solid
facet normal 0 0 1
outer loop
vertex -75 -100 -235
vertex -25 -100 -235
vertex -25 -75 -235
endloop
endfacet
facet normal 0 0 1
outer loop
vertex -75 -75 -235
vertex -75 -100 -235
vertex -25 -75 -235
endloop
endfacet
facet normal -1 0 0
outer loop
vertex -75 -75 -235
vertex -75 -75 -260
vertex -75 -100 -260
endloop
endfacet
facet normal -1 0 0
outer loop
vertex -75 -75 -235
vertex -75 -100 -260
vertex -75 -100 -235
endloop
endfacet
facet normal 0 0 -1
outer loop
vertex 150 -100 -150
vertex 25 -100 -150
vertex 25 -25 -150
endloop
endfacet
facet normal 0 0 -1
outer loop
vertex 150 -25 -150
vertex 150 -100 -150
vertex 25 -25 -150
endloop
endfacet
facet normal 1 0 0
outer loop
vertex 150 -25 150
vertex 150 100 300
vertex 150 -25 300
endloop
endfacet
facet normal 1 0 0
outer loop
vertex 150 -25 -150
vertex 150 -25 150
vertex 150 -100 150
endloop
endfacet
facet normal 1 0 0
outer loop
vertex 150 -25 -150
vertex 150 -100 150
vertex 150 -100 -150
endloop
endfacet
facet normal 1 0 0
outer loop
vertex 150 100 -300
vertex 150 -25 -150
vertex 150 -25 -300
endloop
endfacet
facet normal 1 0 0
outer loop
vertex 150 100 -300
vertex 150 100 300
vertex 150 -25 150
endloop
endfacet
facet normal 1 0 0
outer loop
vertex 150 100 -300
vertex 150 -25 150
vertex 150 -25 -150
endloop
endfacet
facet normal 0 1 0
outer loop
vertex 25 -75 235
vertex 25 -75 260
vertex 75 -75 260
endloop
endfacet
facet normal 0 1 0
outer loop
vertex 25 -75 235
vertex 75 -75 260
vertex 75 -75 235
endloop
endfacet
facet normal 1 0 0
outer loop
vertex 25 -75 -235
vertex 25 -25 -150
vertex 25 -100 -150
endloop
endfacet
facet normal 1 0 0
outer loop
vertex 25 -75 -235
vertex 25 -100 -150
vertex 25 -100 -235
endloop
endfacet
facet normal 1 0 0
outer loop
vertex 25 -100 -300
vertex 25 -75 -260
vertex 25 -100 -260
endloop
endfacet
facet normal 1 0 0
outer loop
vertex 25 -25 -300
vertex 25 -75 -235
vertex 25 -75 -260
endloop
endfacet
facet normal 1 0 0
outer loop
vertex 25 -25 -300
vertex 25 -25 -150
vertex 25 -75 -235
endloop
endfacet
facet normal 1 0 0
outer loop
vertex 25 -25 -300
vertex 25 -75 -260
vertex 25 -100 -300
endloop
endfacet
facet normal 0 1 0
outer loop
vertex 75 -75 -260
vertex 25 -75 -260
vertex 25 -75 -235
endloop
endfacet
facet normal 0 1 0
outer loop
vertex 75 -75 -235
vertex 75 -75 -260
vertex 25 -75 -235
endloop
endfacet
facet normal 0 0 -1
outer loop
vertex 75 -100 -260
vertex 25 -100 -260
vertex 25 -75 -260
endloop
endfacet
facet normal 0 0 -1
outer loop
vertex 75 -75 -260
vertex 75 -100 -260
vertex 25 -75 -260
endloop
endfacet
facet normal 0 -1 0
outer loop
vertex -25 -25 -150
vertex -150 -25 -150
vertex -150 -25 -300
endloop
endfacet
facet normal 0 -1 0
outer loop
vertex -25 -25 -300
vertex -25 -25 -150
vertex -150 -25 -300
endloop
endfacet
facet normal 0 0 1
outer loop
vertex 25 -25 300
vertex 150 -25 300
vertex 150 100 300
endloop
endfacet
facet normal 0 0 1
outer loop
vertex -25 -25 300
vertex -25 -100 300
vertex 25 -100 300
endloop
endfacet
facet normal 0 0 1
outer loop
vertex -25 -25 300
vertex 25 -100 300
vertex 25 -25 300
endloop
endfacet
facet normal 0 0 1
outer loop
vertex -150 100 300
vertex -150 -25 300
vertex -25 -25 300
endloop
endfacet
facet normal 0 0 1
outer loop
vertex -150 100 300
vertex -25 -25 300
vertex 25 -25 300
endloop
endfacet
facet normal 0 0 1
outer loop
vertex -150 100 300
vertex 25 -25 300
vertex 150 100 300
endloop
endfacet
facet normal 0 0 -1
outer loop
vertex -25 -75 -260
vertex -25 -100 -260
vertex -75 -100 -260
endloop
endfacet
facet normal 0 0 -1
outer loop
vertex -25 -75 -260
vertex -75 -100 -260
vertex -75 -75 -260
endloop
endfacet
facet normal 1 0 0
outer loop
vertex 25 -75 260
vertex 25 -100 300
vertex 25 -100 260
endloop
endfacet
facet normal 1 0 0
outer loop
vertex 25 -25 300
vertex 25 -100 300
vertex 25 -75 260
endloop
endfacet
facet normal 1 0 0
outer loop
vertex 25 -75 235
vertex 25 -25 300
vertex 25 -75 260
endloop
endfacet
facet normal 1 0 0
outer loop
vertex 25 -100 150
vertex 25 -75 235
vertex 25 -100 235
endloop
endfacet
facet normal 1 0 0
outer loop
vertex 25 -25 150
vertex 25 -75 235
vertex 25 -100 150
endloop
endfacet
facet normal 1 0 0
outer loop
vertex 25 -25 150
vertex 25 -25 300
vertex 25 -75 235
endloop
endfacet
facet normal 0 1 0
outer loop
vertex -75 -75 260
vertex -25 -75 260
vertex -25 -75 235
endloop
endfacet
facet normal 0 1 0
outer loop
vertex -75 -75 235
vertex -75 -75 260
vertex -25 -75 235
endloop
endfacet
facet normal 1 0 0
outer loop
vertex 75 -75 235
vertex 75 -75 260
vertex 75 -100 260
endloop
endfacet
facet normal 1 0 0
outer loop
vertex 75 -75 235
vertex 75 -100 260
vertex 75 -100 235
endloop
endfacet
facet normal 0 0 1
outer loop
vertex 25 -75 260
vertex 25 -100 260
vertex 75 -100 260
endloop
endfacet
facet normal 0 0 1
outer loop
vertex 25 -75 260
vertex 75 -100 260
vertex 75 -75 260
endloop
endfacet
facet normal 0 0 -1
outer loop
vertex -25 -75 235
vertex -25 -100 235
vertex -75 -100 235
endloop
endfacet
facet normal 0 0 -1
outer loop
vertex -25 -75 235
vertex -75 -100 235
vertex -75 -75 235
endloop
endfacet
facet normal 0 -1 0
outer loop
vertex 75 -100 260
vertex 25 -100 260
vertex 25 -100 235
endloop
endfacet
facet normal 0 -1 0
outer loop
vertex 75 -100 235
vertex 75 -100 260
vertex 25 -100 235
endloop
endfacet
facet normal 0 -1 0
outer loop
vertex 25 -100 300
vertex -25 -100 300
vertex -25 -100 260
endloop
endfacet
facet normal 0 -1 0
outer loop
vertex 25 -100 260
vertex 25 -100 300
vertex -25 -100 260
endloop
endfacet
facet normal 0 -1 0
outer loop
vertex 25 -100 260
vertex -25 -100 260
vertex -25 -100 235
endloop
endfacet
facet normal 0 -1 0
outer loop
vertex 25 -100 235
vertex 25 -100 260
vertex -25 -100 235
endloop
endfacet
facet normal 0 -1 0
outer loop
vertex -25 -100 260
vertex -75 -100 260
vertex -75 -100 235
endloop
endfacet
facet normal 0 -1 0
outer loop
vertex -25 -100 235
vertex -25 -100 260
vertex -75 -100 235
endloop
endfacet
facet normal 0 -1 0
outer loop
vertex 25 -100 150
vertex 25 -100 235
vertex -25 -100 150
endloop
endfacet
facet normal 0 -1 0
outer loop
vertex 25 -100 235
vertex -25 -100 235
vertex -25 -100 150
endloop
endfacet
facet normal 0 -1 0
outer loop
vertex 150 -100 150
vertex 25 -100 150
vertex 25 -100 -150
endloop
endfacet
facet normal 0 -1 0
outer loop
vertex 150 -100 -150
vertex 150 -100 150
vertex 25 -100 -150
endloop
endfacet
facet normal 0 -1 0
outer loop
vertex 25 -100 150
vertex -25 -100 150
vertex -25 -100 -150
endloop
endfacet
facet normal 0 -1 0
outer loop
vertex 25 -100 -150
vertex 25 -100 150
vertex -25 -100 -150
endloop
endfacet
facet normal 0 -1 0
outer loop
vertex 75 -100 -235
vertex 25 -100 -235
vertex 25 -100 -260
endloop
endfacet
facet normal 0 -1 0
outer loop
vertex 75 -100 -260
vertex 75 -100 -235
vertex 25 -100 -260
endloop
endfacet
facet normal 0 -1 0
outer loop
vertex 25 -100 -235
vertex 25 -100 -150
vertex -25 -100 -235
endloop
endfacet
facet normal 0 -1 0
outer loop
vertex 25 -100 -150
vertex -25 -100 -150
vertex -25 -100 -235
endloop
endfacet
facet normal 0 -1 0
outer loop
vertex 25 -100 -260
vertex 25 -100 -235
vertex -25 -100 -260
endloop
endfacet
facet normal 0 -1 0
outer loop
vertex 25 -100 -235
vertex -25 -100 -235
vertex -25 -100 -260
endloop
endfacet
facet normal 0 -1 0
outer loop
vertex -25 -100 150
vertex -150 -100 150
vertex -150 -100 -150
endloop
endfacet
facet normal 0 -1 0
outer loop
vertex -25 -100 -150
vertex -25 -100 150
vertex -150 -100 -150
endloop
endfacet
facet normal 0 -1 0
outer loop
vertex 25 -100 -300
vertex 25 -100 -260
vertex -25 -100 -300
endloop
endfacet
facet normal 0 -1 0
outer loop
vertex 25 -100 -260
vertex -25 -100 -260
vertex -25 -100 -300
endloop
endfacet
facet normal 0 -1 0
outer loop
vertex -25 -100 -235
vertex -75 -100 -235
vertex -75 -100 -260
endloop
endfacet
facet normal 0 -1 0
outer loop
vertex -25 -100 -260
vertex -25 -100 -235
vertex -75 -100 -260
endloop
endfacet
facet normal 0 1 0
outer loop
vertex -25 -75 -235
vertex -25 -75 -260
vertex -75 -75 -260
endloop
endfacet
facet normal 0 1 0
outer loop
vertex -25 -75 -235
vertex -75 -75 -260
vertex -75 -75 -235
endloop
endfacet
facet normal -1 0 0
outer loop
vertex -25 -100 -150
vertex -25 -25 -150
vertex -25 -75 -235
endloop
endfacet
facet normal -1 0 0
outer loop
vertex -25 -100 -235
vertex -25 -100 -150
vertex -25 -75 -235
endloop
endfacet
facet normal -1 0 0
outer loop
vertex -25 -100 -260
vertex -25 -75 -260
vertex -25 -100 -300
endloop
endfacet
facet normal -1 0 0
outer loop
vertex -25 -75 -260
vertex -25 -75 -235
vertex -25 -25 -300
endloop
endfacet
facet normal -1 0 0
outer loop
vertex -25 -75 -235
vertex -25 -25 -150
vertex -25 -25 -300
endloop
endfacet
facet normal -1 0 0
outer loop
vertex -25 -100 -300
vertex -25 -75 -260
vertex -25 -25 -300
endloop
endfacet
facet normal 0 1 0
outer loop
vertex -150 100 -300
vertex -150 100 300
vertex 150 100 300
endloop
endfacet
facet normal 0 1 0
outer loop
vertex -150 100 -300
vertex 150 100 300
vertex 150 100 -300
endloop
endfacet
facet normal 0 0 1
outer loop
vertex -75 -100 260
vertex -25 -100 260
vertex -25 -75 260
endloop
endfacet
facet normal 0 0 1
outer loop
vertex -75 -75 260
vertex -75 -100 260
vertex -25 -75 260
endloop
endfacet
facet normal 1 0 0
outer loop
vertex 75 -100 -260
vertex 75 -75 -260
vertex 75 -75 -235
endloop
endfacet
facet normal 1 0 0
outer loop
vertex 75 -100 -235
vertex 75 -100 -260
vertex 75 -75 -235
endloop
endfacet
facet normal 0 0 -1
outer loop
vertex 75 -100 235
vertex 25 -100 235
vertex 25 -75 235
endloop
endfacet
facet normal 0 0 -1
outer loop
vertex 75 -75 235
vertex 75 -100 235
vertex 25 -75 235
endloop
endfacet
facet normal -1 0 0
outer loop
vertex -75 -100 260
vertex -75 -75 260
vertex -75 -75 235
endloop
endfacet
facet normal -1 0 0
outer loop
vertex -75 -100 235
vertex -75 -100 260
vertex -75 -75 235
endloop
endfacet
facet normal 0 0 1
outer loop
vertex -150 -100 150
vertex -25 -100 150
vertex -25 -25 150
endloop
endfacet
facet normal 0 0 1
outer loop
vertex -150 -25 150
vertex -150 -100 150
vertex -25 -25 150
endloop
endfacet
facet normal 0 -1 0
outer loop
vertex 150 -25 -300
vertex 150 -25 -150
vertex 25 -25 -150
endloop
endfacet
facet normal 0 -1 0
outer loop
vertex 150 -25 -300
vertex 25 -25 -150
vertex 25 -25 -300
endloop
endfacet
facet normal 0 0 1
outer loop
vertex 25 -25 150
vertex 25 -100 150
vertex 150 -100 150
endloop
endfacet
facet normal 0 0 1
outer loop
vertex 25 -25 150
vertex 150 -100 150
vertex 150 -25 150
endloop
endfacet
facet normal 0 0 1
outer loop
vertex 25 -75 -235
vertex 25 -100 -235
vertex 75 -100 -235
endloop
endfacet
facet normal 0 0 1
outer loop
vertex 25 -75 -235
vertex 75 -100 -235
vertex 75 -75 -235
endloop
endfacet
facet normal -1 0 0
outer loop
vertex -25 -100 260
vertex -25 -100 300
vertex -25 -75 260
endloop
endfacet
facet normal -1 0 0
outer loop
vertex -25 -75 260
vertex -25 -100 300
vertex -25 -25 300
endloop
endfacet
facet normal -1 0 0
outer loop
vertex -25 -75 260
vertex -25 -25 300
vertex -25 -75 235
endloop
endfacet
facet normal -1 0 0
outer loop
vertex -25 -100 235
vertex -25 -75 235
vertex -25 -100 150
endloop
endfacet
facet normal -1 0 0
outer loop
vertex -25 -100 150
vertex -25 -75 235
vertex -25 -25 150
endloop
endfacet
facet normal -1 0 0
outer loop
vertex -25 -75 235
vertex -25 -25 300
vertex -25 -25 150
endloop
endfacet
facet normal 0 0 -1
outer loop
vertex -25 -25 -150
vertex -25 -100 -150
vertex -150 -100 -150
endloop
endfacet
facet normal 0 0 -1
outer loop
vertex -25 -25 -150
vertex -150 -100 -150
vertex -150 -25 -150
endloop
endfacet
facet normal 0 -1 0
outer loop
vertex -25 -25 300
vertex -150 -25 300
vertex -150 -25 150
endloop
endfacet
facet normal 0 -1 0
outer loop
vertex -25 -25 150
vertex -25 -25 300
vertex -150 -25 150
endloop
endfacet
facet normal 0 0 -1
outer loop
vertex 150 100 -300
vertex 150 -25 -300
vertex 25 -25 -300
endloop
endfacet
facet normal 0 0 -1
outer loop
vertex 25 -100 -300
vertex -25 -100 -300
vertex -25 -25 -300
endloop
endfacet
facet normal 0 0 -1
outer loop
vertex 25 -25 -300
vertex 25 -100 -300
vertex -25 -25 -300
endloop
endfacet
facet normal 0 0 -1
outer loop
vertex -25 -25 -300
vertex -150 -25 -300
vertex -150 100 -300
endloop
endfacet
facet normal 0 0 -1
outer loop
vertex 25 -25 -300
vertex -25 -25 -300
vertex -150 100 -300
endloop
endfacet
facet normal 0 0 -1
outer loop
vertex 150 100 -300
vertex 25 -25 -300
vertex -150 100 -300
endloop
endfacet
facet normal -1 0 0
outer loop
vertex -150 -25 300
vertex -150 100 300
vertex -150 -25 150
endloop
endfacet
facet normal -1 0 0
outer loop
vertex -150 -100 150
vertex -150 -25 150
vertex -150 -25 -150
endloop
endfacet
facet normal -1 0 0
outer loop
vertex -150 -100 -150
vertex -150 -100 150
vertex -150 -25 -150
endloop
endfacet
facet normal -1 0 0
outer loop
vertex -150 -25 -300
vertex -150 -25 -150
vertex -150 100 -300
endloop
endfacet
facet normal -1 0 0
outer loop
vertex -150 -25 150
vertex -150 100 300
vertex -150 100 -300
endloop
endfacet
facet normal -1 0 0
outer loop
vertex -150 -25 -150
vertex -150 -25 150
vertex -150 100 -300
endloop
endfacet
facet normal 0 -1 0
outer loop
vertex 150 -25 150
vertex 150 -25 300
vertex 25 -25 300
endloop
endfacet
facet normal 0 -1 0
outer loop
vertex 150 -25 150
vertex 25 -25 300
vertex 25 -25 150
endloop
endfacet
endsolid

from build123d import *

# Parameters (mm, degrees)
BOSS_EXTRUDE1_DEPTH      = 150
BOSS_EXTRUDE1_DEPTH_BACK = 150
SKETCH2_W                = 600
SKETCH2_H                = 200
SKETCH3_W                = 150
SKETCH3_H                = 75
CUT_EXTRUDE1_DEPTH       = 125
SKETCH4_W                = 25
SKETCH4_H                = 25
BOSS_EXTRUDE2_DEPTH      = 50
MIRROR3_COPY_1_SKETCH_W  = 25
MIRROR3_COPY_1_SKETCH_H  = 25
MIRROR3_COPY_1_DEPTH     = 50
MIRROR3_COPY_2_SKETCH_W  = 25
MIRROR3_COPY_2_SKETCH_H  = 25
MIRROR3_COPY_2_DEPTH     = 50


with BuildPart() as part:
    # Sketch2 → Boss-Extrude1 (new, two sides: drawn at the far end of the back side and taken through both)
    with BuildSketch(Plane(origin=(0, 0, 0), x_dir=(0, 0, -1), z_dir=(1, 0, 0)).offset(-BOSS_EXTRUDE1_DEPTH_BACK)):
        Rectangle(SKETCH2_W, SKETCH2_H)
    extrude(amount=BOSS_EXTRUDE1_DEPTH + BOSS_EXTRUDE1_DEPTH_BACK)

    # Sketch3 → Cut-Extrude1 (cut)
    with BuildSketch(Plane(origin=(150, 0, 0), x_dir=(0, 0, -1), z_dir=(1, 0, 0))):
        with Locations((-225, -62.5)):
            Rectangle(SKETCH3_W, SKETCH3_H)
        with Locations((225, -62.5)):
            Rectangle(SKETCH3_W, SKETCH3_H)
    cut_extrude1 = extrude(amount=-CUT_EXTRUDE1_DEPTH, mode=Mode.SUBTRACT)

    # Mirror1: Cut-Extrude1 across plane
    add(cut_extrude1.mirror(Plane(origin=(0, 0, 0), x_dir=(0, 0, 1), z_dir=(1, 0, 0))), mode=Mode.SUBTRACT)

    # Sketch4 → Boss-Extrude2 (add)
    with BuildSketch(Plane(origin=(25, 0, 0), x_dir=(0, 0, -1), z_dir=(1, 0, 0))):
        with Locations((-247.5, -87.5)):
            Rectangle(SKETCH4_W, SKETCH4_H)
    boss_extrude2 = extrude(amount=BOSS_EXTRUDE2_DEPTH)

    # Mirror2: Boss-Extrude2 across plane
    add(boss_extrude2.mirror(Plane(origin=(0, 0, 0), x_dir=(0, 0, 1), z_dir=(1, 0, 0))))

    # Mirror3 copy 1 sketch → Mirror3 copy 1 (add)
    with BuildSketch(Plane.ZY.offset(25)):
        with Locations((-247.5, -87.5)):
            Rectangle(MIRROR3_COPY_1_SKETCH_W, MIRROR3_COPY_1_SKETCH_H)
    extrude(amount=MIRROR3_COPY_1_DEPTH)

    # Mirror3 copy 2 sketch → Mirror3 copy 2 (add)
    with BuildSketch(Plane(origin=(25, 0, 0), x_dir=(0, 0, 1), z_dir=(1, 0, 0))):
        with Locations((-247.5, 87.5)):
            Rectangle(MIRROR3_COPY_2_SKETCH_W, MIRROR3_COPY_2_SKETCH_H)
    extrude(amount=MIRROR3_COPY_2_DEPTH)


solid = part.part
